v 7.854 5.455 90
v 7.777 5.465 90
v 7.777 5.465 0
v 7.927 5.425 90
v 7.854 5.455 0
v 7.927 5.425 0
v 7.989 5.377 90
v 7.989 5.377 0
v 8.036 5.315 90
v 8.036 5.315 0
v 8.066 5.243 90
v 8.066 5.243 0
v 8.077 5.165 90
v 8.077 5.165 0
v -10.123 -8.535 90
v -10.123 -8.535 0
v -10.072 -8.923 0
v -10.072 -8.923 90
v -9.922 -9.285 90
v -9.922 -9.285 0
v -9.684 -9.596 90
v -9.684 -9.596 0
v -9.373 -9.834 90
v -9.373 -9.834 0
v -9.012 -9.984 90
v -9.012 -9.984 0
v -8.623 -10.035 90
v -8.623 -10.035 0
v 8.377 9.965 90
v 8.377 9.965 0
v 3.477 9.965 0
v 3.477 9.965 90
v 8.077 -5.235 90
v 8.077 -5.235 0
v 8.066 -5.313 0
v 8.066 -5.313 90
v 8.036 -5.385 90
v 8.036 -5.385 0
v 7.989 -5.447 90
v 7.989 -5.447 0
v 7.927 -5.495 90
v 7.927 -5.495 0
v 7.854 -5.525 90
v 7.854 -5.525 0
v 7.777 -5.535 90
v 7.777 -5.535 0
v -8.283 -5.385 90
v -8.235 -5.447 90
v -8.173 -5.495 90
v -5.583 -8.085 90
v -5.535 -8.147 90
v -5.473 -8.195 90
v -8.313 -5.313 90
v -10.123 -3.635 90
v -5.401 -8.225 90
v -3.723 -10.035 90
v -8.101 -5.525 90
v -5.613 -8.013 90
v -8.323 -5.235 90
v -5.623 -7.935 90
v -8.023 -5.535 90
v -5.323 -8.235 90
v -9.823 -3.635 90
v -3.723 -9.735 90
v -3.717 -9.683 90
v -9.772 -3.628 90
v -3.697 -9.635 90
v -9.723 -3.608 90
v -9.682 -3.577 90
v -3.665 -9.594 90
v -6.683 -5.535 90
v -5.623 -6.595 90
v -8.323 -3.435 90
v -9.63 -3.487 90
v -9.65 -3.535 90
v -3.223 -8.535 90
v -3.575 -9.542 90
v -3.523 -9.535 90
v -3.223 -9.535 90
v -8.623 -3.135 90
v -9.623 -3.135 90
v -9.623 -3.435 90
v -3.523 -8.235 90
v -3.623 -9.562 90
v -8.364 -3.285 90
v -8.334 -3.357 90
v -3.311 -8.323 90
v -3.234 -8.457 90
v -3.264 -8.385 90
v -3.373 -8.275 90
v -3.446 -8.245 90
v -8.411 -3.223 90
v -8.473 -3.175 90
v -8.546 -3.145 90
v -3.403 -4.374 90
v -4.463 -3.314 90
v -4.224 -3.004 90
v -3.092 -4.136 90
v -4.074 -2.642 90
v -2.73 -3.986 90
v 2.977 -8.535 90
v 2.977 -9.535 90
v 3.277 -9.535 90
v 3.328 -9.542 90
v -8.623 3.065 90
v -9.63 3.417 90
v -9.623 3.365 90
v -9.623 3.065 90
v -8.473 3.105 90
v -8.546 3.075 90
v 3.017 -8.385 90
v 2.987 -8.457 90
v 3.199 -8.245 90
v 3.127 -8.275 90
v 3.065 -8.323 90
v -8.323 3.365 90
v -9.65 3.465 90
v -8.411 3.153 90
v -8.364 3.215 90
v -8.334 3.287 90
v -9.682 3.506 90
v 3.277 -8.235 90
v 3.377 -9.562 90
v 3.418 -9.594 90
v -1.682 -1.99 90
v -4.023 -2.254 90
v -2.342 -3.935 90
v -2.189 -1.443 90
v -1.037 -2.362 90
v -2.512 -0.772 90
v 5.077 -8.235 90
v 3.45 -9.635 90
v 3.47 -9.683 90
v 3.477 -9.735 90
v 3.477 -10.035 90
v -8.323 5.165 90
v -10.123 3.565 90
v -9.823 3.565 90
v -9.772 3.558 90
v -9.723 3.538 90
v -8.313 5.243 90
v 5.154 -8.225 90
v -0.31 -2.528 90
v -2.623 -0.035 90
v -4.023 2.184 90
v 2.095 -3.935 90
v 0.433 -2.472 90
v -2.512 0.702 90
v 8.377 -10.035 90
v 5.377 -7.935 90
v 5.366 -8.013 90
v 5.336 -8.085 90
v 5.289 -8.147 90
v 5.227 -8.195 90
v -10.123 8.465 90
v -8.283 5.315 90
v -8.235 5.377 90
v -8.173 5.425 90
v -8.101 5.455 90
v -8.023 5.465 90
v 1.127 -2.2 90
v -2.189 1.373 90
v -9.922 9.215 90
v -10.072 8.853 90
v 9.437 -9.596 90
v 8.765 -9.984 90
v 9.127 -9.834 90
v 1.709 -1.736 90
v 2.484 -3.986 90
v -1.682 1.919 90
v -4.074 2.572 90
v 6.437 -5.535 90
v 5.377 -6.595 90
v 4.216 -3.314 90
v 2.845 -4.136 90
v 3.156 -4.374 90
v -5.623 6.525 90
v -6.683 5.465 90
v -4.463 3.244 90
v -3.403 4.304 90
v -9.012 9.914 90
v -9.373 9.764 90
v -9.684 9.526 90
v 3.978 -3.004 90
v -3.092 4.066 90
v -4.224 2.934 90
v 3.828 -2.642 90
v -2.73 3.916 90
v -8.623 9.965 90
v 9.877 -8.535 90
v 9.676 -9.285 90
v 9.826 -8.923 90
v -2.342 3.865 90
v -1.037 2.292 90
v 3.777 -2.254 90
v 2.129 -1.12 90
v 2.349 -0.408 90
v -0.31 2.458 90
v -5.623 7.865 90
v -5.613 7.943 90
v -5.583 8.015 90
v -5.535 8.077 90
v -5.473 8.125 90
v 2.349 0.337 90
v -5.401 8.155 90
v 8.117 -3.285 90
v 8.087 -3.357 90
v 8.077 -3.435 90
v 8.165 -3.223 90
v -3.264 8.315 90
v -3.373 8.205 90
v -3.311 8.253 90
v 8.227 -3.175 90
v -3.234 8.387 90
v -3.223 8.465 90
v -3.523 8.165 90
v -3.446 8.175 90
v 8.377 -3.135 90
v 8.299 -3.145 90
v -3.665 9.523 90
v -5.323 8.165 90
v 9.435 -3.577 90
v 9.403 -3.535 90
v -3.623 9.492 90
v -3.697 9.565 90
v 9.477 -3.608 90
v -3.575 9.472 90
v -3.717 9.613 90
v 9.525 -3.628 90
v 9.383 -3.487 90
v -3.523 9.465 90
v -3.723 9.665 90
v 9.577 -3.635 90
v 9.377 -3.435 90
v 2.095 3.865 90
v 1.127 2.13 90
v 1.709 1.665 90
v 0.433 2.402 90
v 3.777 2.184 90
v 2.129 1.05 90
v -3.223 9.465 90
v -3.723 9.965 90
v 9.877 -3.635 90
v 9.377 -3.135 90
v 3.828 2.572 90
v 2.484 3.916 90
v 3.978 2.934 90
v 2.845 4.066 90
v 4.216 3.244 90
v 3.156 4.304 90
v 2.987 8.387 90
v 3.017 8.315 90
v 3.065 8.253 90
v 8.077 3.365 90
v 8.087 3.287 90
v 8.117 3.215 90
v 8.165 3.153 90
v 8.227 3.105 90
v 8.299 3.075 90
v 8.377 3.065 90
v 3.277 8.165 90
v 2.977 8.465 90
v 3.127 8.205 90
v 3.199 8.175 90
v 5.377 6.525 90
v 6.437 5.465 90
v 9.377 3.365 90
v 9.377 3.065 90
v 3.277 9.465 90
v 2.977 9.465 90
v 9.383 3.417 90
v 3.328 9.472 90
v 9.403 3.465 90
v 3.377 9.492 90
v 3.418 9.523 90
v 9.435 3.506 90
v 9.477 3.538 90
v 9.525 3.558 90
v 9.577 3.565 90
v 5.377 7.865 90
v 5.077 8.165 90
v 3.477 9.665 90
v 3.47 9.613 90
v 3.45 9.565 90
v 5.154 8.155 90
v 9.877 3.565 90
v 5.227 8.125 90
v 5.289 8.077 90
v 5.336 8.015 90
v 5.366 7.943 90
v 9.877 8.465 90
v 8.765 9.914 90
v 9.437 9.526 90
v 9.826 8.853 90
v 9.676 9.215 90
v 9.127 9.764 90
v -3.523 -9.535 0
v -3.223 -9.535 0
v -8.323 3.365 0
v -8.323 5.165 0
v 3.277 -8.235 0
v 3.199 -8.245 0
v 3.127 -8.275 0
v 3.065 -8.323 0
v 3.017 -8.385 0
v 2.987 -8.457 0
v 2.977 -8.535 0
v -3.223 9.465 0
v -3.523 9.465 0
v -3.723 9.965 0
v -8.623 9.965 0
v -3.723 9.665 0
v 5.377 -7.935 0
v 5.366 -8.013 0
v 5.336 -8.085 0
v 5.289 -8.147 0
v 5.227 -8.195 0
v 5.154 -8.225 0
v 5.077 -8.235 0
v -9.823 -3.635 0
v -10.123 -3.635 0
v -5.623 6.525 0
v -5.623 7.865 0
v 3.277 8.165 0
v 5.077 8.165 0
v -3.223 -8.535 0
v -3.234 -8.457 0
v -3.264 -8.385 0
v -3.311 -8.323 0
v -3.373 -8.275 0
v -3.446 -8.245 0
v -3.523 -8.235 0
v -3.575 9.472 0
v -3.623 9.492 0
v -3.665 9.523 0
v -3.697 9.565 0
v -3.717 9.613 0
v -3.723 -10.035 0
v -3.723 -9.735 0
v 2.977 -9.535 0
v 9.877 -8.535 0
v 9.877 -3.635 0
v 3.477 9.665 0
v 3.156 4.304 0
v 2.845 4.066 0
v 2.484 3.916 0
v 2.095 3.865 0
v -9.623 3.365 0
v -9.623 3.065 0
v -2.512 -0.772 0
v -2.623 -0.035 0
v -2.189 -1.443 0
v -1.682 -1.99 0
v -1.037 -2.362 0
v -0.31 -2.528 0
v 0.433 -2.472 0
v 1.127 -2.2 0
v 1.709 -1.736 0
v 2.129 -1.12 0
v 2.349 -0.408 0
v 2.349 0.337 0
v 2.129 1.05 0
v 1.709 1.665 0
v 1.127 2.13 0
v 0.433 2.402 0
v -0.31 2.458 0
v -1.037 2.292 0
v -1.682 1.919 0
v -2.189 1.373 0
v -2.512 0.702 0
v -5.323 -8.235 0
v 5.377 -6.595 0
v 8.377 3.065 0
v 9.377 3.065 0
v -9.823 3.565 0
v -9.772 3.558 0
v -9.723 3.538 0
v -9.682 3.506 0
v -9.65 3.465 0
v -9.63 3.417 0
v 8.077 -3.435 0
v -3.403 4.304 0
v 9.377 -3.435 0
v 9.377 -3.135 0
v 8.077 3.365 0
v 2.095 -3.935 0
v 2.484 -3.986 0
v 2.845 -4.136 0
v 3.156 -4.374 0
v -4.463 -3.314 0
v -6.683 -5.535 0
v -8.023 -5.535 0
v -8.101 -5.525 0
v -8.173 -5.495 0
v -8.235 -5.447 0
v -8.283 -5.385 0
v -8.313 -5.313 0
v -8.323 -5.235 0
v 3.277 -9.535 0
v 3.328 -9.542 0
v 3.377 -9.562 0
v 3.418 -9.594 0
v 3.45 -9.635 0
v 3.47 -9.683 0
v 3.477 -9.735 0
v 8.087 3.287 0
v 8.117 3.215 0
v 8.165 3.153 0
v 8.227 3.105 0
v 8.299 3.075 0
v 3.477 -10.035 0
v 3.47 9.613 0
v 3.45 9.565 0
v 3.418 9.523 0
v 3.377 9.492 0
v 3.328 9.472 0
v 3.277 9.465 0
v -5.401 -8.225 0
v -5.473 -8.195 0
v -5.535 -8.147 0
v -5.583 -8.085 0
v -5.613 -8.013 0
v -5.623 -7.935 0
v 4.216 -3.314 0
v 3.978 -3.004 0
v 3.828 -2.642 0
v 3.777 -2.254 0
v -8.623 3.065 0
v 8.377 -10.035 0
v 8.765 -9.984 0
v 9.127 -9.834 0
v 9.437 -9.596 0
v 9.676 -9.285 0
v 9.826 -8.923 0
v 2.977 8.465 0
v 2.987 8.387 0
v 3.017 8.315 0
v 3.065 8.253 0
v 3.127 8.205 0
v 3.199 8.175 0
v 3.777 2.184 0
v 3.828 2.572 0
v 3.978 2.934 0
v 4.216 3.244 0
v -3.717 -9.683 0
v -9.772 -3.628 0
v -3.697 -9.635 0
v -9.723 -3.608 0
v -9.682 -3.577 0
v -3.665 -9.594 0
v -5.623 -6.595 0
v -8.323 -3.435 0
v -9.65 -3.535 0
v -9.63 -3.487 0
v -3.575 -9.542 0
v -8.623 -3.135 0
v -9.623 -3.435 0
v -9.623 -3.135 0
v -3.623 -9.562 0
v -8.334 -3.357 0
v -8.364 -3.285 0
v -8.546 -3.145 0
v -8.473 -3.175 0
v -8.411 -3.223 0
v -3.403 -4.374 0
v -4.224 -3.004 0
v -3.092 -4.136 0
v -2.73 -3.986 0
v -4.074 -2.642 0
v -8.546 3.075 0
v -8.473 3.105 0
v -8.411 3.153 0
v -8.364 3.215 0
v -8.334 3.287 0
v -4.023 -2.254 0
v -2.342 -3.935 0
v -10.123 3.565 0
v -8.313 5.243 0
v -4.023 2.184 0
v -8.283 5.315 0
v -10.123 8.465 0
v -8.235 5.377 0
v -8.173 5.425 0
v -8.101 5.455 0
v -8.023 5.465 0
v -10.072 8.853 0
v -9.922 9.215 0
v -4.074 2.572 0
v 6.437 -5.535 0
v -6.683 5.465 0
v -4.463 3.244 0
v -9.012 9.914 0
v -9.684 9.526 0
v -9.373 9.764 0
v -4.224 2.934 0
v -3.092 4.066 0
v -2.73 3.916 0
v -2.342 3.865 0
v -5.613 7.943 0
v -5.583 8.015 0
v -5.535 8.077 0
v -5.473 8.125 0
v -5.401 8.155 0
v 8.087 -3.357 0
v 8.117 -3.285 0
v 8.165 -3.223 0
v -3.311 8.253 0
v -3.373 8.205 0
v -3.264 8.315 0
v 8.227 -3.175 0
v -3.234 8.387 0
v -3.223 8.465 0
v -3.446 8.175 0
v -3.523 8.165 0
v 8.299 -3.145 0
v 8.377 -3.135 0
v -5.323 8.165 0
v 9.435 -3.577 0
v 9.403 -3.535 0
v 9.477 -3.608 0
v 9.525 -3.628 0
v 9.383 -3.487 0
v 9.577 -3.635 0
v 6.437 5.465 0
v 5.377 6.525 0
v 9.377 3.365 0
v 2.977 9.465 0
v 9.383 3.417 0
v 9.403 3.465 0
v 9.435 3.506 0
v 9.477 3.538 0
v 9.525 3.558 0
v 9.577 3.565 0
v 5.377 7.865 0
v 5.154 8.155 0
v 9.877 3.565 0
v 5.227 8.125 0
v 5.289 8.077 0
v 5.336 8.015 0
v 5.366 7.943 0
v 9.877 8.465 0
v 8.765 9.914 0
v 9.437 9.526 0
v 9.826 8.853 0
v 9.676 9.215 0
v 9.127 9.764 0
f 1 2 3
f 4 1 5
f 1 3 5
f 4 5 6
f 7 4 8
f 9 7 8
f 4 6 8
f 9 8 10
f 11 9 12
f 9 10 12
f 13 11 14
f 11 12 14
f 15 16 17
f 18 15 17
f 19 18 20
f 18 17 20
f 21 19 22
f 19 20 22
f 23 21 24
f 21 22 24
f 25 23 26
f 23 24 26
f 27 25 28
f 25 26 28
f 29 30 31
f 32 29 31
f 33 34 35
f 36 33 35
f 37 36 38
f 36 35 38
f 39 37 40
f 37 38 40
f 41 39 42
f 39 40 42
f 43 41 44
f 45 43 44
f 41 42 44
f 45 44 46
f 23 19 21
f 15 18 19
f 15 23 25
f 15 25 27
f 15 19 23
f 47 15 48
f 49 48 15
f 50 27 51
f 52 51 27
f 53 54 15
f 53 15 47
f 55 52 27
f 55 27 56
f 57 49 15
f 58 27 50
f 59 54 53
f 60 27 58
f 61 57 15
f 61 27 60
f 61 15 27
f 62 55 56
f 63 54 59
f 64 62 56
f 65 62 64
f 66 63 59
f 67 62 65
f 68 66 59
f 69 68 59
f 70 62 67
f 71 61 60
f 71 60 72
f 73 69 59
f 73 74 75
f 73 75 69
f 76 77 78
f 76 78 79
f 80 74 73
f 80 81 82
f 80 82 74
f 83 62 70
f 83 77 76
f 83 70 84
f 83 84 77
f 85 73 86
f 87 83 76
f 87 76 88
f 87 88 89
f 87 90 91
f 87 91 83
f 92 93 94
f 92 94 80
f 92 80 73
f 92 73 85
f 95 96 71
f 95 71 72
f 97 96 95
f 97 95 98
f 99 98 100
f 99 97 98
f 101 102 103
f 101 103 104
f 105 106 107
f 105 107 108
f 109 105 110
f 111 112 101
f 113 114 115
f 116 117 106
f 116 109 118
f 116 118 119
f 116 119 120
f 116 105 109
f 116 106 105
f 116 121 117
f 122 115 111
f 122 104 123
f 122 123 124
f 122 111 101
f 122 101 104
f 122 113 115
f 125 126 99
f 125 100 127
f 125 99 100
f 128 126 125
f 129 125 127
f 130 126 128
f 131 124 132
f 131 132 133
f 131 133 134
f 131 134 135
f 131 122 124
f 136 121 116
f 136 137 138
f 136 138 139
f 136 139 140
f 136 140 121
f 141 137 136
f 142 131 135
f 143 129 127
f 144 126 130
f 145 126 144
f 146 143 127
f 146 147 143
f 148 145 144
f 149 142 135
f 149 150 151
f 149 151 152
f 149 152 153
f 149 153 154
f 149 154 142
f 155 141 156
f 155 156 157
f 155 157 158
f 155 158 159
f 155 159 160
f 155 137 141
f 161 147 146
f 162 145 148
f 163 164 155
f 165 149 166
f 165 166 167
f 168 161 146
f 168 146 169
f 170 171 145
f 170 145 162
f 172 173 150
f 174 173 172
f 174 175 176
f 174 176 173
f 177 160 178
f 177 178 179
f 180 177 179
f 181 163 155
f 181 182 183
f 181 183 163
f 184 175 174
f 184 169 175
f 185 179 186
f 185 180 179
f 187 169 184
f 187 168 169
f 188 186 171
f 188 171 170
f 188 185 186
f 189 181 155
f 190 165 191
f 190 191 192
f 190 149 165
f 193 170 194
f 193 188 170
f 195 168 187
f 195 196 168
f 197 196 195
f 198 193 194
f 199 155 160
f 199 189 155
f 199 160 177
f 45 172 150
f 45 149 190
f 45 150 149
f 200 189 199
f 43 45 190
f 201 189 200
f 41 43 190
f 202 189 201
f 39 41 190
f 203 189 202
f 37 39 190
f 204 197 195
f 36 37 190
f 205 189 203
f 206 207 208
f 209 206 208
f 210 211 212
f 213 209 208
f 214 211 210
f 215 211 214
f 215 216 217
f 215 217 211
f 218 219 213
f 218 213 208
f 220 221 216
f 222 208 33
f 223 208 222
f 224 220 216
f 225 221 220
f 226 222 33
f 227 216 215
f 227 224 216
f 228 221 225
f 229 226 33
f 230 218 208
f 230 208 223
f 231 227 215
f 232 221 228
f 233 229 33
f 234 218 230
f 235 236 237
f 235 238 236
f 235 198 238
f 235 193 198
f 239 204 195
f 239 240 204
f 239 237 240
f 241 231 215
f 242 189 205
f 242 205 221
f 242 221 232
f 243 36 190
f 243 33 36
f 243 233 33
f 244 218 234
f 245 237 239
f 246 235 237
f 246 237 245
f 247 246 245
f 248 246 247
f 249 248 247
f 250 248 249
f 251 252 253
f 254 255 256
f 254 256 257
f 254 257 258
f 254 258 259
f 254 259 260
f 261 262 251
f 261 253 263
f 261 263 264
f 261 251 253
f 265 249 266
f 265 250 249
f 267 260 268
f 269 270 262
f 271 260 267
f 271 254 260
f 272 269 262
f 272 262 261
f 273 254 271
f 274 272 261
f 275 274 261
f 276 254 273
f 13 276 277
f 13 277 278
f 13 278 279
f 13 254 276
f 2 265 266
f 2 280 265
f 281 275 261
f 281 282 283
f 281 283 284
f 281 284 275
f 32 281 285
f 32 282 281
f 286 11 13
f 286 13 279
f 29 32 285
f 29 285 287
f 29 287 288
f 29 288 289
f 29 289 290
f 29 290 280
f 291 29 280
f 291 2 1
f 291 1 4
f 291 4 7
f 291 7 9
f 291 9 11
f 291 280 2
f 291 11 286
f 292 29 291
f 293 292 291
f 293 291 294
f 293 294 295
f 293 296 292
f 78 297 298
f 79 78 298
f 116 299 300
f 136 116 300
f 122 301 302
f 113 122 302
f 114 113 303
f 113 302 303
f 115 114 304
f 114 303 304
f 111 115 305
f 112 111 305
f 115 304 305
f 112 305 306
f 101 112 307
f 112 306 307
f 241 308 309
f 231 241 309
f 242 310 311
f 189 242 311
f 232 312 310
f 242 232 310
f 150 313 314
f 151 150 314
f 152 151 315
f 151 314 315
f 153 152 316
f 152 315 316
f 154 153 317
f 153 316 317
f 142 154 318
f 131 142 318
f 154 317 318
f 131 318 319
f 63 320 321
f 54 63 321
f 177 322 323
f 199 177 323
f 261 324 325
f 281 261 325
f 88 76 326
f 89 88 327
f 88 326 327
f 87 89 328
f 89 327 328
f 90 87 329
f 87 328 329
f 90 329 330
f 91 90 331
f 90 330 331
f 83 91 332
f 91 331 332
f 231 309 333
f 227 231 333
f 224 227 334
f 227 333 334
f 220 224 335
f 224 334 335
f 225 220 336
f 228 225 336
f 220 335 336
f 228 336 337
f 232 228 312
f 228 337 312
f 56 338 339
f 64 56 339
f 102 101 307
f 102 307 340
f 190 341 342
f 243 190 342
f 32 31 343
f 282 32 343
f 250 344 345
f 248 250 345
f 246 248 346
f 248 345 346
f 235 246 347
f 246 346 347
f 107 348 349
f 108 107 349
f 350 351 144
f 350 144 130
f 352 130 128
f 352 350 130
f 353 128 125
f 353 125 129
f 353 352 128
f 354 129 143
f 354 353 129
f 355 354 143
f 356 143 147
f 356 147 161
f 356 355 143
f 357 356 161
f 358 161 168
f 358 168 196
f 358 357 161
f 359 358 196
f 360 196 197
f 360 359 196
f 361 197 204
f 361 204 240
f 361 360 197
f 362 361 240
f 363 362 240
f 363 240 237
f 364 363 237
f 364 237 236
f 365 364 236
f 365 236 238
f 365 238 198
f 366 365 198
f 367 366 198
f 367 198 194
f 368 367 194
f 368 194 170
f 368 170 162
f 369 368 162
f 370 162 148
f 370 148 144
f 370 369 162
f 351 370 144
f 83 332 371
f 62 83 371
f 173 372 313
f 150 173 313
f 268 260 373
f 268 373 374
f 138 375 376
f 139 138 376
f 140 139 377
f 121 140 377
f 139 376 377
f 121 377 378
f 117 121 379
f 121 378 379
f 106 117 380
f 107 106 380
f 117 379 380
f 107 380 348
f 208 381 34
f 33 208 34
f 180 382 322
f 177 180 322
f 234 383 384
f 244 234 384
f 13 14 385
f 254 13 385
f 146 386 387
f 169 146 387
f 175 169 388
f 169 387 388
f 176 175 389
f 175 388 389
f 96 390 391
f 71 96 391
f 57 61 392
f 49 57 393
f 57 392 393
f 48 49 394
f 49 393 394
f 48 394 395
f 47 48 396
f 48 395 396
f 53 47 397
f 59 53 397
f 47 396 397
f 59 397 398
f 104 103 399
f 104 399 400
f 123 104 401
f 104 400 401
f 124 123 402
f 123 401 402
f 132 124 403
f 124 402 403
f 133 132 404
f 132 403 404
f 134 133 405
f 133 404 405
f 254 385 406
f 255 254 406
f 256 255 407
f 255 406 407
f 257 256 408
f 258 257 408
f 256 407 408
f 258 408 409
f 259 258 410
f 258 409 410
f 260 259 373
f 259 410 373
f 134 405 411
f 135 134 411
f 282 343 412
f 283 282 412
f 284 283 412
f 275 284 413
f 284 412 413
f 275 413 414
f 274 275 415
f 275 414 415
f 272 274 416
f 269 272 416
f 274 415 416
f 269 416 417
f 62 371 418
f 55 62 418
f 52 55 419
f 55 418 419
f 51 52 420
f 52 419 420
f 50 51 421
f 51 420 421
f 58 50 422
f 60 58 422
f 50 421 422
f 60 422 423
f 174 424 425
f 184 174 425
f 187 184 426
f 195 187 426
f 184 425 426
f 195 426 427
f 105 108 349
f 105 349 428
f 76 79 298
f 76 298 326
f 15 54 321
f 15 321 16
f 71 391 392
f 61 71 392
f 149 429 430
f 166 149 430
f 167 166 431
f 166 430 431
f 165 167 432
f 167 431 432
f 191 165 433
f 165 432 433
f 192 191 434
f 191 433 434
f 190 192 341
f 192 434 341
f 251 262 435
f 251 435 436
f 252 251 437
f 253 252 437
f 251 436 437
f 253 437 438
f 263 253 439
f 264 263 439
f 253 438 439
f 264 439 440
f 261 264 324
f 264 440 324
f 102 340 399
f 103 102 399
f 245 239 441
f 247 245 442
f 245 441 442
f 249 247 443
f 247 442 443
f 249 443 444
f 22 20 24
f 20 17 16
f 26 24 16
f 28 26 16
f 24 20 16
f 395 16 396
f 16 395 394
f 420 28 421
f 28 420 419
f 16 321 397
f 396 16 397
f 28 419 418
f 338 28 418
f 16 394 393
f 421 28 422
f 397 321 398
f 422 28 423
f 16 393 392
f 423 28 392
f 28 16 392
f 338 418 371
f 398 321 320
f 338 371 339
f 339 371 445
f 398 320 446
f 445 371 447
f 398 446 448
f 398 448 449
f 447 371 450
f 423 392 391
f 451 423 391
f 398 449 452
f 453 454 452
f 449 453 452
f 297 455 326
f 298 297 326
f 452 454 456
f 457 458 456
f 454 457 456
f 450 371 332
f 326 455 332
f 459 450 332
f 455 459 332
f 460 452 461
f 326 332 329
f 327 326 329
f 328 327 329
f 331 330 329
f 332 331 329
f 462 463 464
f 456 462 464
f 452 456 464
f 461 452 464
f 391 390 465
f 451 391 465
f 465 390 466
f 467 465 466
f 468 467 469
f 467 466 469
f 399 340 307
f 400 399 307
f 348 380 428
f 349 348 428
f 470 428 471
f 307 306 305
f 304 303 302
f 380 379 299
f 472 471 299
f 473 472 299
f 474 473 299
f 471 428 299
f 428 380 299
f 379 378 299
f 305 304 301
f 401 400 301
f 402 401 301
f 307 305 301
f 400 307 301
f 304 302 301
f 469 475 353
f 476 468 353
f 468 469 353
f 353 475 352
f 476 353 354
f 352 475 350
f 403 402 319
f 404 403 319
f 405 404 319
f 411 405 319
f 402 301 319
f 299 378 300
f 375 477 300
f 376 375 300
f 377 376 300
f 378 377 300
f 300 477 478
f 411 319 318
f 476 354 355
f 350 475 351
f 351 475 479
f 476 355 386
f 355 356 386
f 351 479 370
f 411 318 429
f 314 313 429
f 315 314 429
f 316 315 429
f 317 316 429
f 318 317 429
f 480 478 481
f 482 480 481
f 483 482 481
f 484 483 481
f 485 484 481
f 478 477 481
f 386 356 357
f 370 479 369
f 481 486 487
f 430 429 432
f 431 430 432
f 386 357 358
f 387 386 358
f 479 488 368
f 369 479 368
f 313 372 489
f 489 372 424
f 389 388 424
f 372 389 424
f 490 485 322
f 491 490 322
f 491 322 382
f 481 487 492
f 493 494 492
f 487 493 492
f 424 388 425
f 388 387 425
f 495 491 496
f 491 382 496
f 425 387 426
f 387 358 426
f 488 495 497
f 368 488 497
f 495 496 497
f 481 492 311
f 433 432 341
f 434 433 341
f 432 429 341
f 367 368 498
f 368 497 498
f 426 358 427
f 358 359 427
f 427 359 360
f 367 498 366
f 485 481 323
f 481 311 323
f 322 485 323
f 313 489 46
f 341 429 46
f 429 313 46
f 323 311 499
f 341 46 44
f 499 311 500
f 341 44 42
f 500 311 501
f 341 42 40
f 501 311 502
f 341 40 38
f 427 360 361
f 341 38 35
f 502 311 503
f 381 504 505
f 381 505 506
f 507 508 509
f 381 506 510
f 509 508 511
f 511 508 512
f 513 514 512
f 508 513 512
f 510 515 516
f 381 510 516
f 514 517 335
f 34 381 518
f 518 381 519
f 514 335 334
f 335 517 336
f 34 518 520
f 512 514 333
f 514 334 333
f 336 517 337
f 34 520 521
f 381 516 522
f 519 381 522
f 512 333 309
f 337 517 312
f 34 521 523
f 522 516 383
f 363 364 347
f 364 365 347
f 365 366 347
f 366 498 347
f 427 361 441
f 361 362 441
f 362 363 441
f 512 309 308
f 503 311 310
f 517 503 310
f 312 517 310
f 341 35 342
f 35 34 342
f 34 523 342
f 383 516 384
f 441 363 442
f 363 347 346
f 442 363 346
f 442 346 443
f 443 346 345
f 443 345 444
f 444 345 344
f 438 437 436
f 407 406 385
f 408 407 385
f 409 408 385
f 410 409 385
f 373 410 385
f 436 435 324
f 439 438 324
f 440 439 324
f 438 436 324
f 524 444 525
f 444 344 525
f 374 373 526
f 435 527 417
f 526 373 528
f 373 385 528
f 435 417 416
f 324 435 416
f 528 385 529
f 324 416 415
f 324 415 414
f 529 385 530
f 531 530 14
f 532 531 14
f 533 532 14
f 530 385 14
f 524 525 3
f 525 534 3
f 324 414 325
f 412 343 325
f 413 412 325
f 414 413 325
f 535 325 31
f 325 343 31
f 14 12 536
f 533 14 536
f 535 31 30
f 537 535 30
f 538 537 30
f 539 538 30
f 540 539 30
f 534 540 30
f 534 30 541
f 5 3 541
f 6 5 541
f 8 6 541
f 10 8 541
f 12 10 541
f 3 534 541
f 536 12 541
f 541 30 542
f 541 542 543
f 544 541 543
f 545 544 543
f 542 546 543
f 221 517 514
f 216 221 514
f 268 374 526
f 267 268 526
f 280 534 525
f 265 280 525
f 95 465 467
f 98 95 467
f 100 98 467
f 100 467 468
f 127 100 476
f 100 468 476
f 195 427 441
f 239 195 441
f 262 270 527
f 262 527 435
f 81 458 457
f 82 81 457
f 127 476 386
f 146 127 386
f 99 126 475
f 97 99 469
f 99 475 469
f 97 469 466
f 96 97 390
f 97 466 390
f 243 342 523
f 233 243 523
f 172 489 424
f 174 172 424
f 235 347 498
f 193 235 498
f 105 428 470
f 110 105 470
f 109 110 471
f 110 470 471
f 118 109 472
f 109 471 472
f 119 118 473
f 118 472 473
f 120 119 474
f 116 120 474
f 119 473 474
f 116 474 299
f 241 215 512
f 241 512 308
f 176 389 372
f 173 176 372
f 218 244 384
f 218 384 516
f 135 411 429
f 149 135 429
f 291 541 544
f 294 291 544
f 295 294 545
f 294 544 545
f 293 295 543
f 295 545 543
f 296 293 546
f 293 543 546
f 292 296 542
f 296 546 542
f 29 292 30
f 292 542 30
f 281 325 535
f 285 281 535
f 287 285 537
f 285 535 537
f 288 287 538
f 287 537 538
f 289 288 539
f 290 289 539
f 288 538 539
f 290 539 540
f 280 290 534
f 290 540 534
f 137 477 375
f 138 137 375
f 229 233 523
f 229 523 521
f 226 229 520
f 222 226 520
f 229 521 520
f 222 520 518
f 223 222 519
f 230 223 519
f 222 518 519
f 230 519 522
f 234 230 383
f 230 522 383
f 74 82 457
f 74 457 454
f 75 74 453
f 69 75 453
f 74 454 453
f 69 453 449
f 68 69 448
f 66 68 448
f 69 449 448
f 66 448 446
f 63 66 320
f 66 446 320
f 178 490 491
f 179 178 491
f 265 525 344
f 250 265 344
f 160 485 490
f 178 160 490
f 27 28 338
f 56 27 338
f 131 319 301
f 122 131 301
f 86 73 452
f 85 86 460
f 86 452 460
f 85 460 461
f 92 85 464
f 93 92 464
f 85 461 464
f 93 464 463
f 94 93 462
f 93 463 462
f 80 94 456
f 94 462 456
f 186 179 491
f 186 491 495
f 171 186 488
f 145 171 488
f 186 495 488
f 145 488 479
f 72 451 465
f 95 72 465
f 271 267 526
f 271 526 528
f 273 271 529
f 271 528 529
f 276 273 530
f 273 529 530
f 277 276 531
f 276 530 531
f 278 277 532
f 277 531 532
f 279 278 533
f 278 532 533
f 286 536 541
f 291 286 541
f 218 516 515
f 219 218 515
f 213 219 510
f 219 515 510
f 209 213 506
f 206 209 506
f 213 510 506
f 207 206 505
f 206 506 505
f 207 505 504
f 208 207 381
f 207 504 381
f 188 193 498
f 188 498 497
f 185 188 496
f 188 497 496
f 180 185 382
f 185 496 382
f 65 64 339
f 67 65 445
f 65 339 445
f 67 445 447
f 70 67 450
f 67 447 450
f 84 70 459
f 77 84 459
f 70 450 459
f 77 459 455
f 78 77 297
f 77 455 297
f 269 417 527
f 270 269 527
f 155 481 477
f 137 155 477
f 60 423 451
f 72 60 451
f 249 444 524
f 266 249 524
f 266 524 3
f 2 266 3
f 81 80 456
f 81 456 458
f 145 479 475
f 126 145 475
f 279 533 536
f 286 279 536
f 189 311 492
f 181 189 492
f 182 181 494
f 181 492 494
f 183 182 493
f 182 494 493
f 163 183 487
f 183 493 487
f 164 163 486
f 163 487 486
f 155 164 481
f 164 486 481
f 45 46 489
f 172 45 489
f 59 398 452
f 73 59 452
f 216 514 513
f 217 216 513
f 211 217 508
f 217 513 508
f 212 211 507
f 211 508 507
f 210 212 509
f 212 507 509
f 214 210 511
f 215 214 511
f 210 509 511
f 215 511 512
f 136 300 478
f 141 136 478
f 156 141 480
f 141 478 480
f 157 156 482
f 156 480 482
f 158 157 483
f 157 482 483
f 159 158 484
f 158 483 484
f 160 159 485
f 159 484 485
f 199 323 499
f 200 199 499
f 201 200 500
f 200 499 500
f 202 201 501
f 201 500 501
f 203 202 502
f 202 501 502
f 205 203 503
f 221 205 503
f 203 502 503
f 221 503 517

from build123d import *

# Parameters (mm, degrees)
SKETCH_1_R      = 2.5
EXTRUDE_1_DEPTH = 90


with BuildPart() as part:
    # 草图1 → 凸台-拉伸1 (new body)
    with BuildSketch(Plane.XY):
        with BuildLine():
            Line((4.215995631, 3.244230202), (6.436655803, 5.464890373))
            Line((6.436655803, 5.464890373), (7.776655803, 5.464890373))
            ThreePointArc((7.776655803, 5.464890373), (7.988787838, 5.377022408), (8.076655803, 5.164890373))
            Line((8.076655803, 5.164890373), (8.076655803, 3.364890373))
            ThreePointArc((8.076655803, 3.364890373), (8.164523769, 3.152758339), (8.376655803, 3.064890373))
            Line((8.376655803, 3.064890373), (9.376655803, 3.064890373))
            Line((9.376655803, 3.064890373), (9.376655803, 3.364890373))
            ThreePointArc((9.376655803, 3.364890373), (9.435234447, 3.50631173), (9.576655803, 3.564890373))
            Line((9.576655803, 3.564890373), (9.876655803, 3.564890373))
            Line((9.876655803, 3.564890373), (9.876655803, 8.464890373))
            ThreePointArc((9.876655803, 8.464890373), (9.437315975, 9.525550545), (8.376655803, 9.964890373))
            Line((8.376655803, 9.964890373), (3.476655803, 9.964890373))
            Line((3.476655803, 9.964890373), (3.476655803, 9.664890373))
            ThreePointArc((3.476655803, 9.664890373), (3.418077159, 9.523469017), (3.276655803, 9.464890373))
            Line((3.276655803, 9.464890373), (2.976655803, 9.464890373))
            Line((2.976655803, 9.464890373), (2.976655803, 8.464890373))
            ThreePointArc((2.976655803, 8.464890373), (3.064523769, 8.252758339), (3.276655803, 8.164890373))
            Line((3.276655803, 8.164890373), (5.076655803, 8.164890373))
            ThreePointArc((5.076655803, 8.164890373), (5.288787838, 8.077022408), (5.376655803, 7.864890373))
            Line((5.376655803, 7.864890373), (5.376655803, 6.524890373))
            Line((5.376655803, 6.524890373), (3.155995631, 4.304230202))
            ThreePointArc((3.155995631, 4.304230202), (2.669360608, 3.979071075), (2.09533546, 3.864890373))
            Line((2.09533546, 3.864890373), (-2.342023853, 3.864890373))
            ThreePointArc((-2.342023853, 3.864890373), (-2.916049002, 3.979071075), (-3.402684025, 4.304230202))
            Line((-3.402684025, 4.304230202), (-5.623344197, 6.524890373))
            Line((-5.623344197, 6.524890373), (-5.623344197, 7.864890373))
            ThreePointArc((-5.623344197, 7.864890373), (-5.535476231, 8.077022408), (-5.323344197, 8.164890373))
            Line((-5.323344197, 8.164890373), (-3.523344197, 8.164890373))
            ThreePointArc((-3.523344197, 8.164890373), (-3.311212162, 8.252758339), (-3.223344197, 8.464890373))
            Line((-3.223344197, 8.464890373), (-3.223344197, 9.464890373))
            Line((-3.223344197, 9.464890373), (-3.523344197, 9.464890373))
            ThreePointArc((-3.523344197, 9.464890373), (-3.664765553, 9.523469017), (-3.723344197, 9.664890373))
            Line((-3.723344197, 9.664890373), (-3.723344197, 9.964890373))
            Line((-3.723344197, 9.964890373), (-8.623344197, 9.964890373))
            ThreePointArc((-8.623344197, 9.964890373), (-9.684004369, 9.525550545), (-10.123344197, 8.464890373))
            Line((-10.123344197, 8.464890373), (-10.123344197, 3.564890373))
            Line((-10.123344197, 3.564890373), (-9.823344197, 3.564890373))
            ThreePointArc((-9.823344197, 3.564890373), (-9.681922841, 3.50631173), (-9.623344197, 3.364890373))
            Line((-9.623344197, 3.364890373), (-9.623344197, 3.064890373))
            Line((-9.623344197, 3.064890373), (-8.623344197, 3.064890373))
            ThreePointArc((-8.623344197, 3.064890373), (-8.411212162, 3.152758339), (-8.323344197, 3.364890373))
            Line((-8.323344197, 3.364890373), (-8.323344197, 5.164890373))
            ThreePointArc((-8.323344197, 5.164890373), (-8.235476231, 5.377022408), (-8.023344197, 5.464890373))
            Line((-8.023344197, 5.464890373), (-6.683344197, 5.464890373))
            Line((-6.683344197, 5.464890373), (-4.462684025, 3.244230202))
            ThreePointArc((-4.462684025, 3.244230202), (-4.137524898, 2.757595178), (-4.023344197, 2.18357003))
            Line((-4.023344197, 2.18357003), (-4.023344197, -2.253789283))
            ThreePointArc((-4.023344197, -2.253789283), (-4.137524898, -2.827814432), (-4.462684025, -3.314449455))
            Line((-4.462684025, -3.314449455), (-6.683344197, -5.535109627))
            Line((-6.683344197, -5.535109627), (-8.023344197, -5.535109627))
            ThreePointArc((-8.023344197, -5.535109627), (-8.235476231, -5.447241661), (-8.323344197, -5.235109627))
            Line((-8.323344197, -5.235109627), (-8.323344197, -3.435109627))
            ThreePointArc((-8.323344197, -3.435109627), (-8.411212162, -3.222977592), (-8.623344197, -3.135109627))
            Line((-8.623344197, -3.135109627), (-9.623344197, -3.135109627))
            Line((-9.623344197, -3.135109627), (-9.623344197, -3.435109627))
            ThreePointArc((-9.623344197, -3.435109627), (-9.681922841, -3.576530983), (-9.823344197, -3.635109627))
            Line((-9.823344197, -3.635109627), (-10.123344197, -3.635109627))
            Line((-10.123344197, -3.635109627), (-10.123344197, -8.535109627))
            ThreePointArc((-10.123344197, -8.535109627), (-9.684004369, -9.595769798), (-8.623344197, -10.035109627))
            Line((-8.623344197, -10.035109627), (-3.723344197, -10.035109627))
            Line((-3.723344197, -10.035109627), (-3.723344197, -9.735109627))
            ThreePointArc((-3.723344197, -9.735109627), (-3.664765553, -9.59368827), (-3.523344197, -9.535109627))
            Line((-3.523344197, -9.535109627), (-3.223344197, -9.535109627))
            Line((-3.223344197, -9.535109627), (-3.223344197, -8.535109627))
            ThreePointArc((-3.223344197, -8.535109627), (-3.311212162, -8.322977592), (-3.523344197, -8.235109627))
            Line((-3.523344197, -8.235109627), (-5.323344197, -8.235109627))
            ThreePointArc((-5.323344197, -8.235109627), (-5.535476231, -8.147241661), (-5.623344197, -7.935109627))
            Line((-5.623344197, -7.935109627), (-5.623344197, -6.595109627))
            Line((-5.623344197, -6.595109627), (-3.402684025, -4.374449455))
            ThreePointArc((-3.402684025, -4.374449455), (-2.916049002, -4.049290328), (-2.342023853, -3.935109627))
            Line((-2.342023853, -3.935109627), (2.09533546, -3.935109627))
            ThreePointArc((2.09533546, -3.935109627), (2.669360608, -4.049290328), (3.155995631, -4.374449455))
            Line((3.155995631, -4.374449455), (5.376655803, -6.595109627))
            Line((5.376655803, -6.595109627), (5.376655803, -7.935109627))
            ThreePointArc((5.376655803, -7.935109627), (5.288787838, -8.147241661), (5.076655803, -8.235109627))
            Line((5.076655803, -8.235109627), (3.276655803, -8.235109627))
            ThreePointArc((3.276655803, -8.235109627), (3.064523769, -8.322977592), (2.976655803, -8.535109627))
            Line((2.976655803, -8.535109627), (2.976655803, -9.535109627))
            Line((2.976655803, -9.535109627), (3.276655803, -9.535109627))
            ThreePointArc((3.276655803, -9.535109627), (3.418077159, -9.59368827), (3.476655803, -9.735109627))
            Line((3.476655803, -9.735109627), (3.476655803, -10.035109627))
            Line((3.476655803, -10.035109627), (8.376655803, -10.035109627))
            ThreePointArc((8.376655803, -10.035109627), (9.437315975, -9.595769798), (9.876655803, -8.535109627))
            Line((9.876655803, -8.535109627), (9.876655803, -3.635109627))
            Line((9.876655803, -3.635109627), (9.576655803, -3.635109627))
            ThreePointArc((9.576655803, -3.635109627), (9.435234447, -3.576530983), (9.376655803, -3.435109627))
            Line((9.376655803, -3.435109627), (9.376655803, -3.135109627))
            Line((9.376655803, -3.135109627), (8.376655803, -3.135109627))
            ThreePointArc((8.376655803, -3.135109627), (8.164523769, -3.222977592), (8.076655803, -3.435109627))
            Line((8.076655803, -3.435109627), (8.076655803, -5.235109627))
            ThreePointArc((8.076655803, -5.235109627), (7.988787838, -5.447241661), (7.776655803, -5.535109627))
            Line((7.776655803, -5.535109627), (6.436655803, -5.535109627))
            Line((6.436655803, -5.535109627), (4.215995631, -3.314449455))
            ThreePointArc((4.215995631, -3.314449455), (3.890836504, -2.827814432), (3.776655803, -2.253789283))
            Line((3.776655803, -2.253789283), (3.776655803, 2.18357003))
            ThreePointArc((3.776655803, 2.18357003), (3.890836504, 2.757595178), (4.215995631, 3.244230202))
        make_face()
        with Locations(Location((-0.123344197, -0.035109627, 0), (0, 0, 180))):
            Circle(SKETCH_1_R, mode=Mode.SUBTRACT)
    extrude(amount=EXTRUDE_1_DEPTH)


solid = part.part
